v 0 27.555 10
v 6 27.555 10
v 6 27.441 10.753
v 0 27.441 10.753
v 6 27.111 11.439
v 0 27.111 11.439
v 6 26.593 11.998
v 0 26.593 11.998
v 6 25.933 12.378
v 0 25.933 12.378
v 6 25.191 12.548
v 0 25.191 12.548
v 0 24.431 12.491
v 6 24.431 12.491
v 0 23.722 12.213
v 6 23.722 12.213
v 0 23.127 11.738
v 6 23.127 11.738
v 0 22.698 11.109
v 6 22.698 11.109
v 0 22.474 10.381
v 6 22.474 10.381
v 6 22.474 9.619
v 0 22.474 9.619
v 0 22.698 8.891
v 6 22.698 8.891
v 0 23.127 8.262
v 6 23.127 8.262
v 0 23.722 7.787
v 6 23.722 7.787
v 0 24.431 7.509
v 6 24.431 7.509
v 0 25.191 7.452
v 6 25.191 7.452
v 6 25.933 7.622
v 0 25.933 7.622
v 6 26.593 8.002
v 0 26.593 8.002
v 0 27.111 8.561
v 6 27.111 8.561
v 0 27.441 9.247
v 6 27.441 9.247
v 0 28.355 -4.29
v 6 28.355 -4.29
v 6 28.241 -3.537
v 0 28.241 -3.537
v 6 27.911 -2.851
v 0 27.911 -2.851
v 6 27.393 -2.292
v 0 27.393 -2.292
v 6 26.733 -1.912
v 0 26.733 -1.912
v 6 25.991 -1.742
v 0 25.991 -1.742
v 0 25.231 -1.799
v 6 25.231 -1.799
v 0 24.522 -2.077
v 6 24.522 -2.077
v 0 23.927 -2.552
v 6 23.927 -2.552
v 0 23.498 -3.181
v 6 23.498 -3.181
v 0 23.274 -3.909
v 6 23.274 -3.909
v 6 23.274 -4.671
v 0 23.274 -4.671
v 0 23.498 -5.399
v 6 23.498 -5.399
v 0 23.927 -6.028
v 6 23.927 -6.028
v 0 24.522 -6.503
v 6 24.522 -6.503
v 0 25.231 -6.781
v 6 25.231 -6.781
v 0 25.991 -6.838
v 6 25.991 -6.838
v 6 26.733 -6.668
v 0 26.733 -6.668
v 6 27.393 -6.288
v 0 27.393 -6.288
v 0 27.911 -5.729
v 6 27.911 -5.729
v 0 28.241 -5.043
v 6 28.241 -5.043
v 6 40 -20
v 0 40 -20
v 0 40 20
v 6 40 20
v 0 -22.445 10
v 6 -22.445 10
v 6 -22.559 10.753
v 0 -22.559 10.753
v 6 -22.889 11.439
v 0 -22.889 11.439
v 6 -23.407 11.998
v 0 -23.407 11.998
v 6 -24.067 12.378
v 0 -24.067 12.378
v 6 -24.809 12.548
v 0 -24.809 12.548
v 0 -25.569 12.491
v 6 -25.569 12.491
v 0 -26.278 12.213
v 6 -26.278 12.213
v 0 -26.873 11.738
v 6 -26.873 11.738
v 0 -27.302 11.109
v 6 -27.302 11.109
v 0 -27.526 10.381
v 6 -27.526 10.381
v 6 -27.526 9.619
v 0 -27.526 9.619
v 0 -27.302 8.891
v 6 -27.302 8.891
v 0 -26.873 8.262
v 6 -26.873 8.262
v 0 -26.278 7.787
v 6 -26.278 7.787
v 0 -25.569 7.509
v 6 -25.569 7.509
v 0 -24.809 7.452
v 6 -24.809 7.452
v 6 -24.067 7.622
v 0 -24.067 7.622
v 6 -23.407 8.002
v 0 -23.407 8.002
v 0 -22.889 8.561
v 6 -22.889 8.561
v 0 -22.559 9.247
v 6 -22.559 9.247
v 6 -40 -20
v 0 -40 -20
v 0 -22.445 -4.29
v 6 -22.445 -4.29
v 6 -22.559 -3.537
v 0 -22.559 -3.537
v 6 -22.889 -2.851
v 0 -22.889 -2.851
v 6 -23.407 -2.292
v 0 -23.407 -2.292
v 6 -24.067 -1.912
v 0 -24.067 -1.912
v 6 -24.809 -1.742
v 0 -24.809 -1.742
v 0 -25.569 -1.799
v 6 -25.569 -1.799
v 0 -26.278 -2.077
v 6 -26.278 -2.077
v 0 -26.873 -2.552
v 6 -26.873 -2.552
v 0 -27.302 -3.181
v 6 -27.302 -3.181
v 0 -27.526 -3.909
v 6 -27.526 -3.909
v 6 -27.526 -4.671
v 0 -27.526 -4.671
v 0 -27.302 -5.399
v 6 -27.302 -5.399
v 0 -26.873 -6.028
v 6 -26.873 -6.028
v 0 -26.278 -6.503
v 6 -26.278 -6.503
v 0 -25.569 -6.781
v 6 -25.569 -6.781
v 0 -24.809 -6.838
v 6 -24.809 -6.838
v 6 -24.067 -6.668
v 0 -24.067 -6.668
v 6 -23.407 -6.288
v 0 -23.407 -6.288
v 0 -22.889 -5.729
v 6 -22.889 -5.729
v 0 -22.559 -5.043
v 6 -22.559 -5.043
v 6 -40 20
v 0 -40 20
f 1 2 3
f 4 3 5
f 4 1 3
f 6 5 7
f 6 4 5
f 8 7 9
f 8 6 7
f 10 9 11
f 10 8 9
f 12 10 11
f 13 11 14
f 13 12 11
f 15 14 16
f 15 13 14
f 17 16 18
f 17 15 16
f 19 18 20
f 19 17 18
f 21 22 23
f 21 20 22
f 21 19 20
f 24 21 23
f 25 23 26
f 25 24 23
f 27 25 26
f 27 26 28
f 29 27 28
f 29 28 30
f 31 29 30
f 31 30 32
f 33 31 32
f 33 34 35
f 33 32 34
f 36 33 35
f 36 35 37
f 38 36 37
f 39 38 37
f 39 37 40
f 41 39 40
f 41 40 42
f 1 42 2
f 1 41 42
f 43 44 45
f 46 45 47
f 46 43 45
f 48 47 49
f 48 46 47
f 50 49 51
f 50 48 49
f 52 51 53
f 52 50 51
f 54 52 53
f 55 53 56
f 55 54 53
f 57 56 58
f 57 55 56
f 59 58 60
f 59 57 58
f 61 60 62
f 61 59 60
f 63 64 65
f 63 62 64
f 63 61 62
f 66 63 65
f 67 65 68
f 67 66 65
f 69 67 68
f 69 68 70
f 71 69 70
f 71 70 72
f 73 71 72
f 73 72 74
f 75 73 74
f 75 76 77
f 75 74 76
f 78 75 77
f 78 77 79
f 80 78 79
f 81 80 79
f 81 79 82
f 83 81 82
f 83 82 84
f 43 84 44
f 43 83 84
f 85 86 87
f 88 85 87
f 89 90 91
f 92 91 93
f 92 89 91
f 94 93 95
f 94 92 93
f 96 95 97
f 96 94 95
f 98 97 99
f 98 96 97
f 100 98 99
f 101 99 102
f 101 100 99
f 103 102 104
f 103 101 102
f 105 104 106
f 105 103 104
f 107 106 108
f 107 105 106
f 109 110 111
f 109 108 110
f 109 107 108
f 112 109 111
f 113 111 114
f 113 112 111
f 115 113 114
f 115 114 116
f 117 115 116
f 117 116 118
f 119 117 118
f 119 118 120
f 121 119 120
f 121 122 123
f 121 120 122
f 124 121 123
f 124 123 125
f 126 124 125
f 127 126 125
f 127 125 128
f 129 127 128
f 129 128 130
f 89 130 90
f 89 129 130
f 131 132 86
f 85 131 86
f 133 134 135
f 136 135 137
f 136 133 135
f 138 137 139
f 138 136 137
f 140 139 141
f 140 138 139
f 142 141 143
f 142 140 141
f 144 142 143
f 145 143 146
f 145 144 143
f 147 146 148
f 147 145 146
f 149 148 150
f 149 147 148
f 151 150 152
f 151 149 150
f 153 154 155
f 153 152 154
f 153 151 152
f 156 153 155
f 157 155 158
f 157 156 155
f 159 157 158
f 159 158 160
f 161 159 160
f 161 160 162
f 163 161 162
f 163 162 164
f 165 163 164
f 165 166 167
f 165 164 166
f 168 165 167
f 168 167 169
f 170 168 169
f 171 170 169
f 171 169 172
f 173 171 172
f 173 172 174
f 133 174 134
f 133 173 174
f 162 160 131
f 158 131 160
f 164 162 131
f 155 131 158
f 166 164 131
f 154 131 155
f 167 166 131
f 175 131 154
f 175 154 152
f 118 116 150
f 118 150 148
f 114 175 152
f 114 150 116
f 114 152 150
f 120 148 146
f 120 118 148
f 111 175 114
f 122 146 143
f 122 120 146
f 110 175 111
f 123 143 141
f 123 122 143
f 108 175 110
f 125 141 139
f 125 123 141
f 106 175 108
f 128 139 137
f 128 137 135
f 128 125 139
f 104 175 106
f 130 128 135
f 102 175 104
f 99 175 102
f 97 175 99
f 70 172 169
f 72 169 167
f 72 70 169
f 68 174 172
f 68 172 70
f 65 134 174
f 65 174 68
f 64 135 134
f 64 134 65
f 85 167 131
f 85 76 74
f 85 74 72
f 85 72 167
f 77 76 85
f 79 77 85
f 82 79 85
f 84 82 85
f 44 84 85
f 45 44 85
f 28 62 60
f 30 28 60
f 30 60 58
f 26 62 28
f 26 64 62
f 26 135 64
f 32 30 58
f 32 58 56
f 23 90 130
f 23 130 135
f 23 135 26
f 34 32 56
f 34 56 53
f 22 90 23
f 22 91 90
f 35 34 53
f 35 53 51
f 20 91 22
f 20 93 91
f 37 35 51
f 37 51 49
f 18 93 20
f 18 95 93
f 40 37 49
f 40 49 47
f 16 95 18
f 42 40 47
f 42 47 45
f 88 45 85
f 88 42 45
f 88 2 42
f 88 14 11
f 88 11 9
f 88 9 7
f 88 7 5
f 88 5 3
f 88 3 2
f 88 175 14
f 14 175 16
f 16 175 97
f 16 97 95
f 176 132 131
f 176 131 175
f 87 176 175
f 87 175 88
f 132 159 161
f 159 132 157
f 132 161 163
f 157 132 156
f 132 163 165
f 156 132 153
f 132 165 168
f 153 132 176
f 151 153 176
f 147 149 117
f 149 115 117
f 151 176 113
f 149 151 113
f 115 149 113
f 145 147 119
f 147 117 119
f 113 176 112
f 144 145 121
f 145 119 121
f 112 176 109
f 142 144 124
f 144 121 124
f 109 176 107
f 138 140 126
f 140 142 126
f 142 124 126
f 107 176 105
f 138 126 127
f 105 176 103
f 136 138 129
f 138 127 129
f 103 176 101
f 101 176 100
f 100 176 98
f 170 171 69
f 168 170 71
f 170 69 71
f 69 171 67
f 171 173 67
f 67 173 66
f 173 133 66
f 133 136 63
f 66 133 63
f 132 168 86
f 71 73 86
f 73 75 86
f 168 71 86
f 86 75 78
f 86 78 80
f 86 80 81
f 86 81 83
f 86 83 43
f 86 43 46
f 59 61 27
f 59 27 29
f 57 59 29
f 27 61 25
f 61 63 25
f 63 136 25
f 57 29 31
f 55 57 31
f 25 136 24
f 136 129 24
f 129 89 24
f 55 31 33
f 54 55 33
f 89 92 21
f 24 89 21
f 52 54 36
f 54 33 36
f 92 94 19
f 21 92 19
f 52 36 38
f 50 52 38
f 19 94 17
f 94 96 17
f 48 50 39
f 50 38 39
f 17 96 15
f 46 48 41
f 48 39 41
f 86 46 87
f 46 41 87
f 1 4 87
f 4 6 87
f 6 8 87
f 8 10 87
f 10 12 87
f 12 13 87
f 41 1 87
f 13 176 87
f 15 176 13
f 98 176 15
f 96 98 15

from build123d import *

# Parameters (mm, degrees)
SKETCH1_W           = 80
SKETCH1_H           = 40
BOSS_EXTRUDE2_DEPTH = 6
CUT_EXTRUDE3_REACH  = 47.122
SKETCH1_3_R         = 2.555


with BuildPart() as part:
    # Sketch1 → Boss-Extrude2 (new body)
    with BuildSketch(Plane.YZ):
        Rectangle(SKETCH1_W, SKETCH1_H)
    extrude(amount=BOSS_EXTRUDE2_DEPTH)

    # Sketch1<3> → Cut-Extrude3 (cut, up to next)
    with BuildSketch(Plane.YZ, mode=Mode.PRIVATE) as cut_extrude3_sk1:
        with Locations((-25, -4.29)):
            Circle(SKETCH1_3_R)
    cut_extrude3_tool1 = extrude(cut_extrude3_sk1.sketch, amount=CUT_EXTRUDE3_REACH, mode=Mode.PRIVATE) & part.part
    # Sketch1<3> → Cut-Extrude3 (cut, up to next)
    with BuildSketch(Plane.YZ, mode=Mode.PRIVATE) as cut_extrude3_sk2:
        with Locations((25.8, -4.29)):
            Circle(SKETCH1_3_R)
    cut_extrude3_tool2 = extrude(cut_extrude3_sk2.sketch, amount=CUT_EXTRUDE3_REACH, mode=Mode.PRIVATE) & part.part
    # Sketch1<3> → Cut-Extrude3 (cut, up to next)
    with BuildSketch(Plane.YZ, mode=Mode.PRIVATE) as cut_extrude3_sk3:
        with Locations((-25, 10)):
            Circle(SKETCH1_3_R)
    cut_extrude3_tool3 = extrude(cut_extrude3_sk3.sketch, amount=CUT_EXTRUDE3_REACH, mode=Mode.PRIVATE) & part.part
    # Sketch1<3> → Cut-Extrude3 (cut, up to next)
    with BuildSketch(Plane.YZ, mode=Mode.PRIVATE) as cut_extrude3_sk4:
        with Locations((25, 10)):
            Circle(SKETCH1_3_R)
    cut_extrude3_tool4 = extrude(cut_extrude3_sk4.sketch, amount=CUT_EXTRUDE3_REACH, mode=Mode.PRIVATE) & part.part
    add(cut_extrude3_tool1.solids().sort_by_distance((0, -25, -4.29))[0], mode=Mode.SUBTRACT)
    add(cut_extrude3_tool2.solids().sort_by_distance((0, 25.8, -4.29))[0], mode=Mode.SUBTRACT)
    add(cut_extrude3_tool3.solids().sort_by_distance((0, -25, 10))[0], mode=Mode.SUBTRACT)
    add(cut_extrude3_tool4.solids().sort_by_distance((0, 25, 10))[0], mode=Mode.SUBTRACT)


solid = part.part
